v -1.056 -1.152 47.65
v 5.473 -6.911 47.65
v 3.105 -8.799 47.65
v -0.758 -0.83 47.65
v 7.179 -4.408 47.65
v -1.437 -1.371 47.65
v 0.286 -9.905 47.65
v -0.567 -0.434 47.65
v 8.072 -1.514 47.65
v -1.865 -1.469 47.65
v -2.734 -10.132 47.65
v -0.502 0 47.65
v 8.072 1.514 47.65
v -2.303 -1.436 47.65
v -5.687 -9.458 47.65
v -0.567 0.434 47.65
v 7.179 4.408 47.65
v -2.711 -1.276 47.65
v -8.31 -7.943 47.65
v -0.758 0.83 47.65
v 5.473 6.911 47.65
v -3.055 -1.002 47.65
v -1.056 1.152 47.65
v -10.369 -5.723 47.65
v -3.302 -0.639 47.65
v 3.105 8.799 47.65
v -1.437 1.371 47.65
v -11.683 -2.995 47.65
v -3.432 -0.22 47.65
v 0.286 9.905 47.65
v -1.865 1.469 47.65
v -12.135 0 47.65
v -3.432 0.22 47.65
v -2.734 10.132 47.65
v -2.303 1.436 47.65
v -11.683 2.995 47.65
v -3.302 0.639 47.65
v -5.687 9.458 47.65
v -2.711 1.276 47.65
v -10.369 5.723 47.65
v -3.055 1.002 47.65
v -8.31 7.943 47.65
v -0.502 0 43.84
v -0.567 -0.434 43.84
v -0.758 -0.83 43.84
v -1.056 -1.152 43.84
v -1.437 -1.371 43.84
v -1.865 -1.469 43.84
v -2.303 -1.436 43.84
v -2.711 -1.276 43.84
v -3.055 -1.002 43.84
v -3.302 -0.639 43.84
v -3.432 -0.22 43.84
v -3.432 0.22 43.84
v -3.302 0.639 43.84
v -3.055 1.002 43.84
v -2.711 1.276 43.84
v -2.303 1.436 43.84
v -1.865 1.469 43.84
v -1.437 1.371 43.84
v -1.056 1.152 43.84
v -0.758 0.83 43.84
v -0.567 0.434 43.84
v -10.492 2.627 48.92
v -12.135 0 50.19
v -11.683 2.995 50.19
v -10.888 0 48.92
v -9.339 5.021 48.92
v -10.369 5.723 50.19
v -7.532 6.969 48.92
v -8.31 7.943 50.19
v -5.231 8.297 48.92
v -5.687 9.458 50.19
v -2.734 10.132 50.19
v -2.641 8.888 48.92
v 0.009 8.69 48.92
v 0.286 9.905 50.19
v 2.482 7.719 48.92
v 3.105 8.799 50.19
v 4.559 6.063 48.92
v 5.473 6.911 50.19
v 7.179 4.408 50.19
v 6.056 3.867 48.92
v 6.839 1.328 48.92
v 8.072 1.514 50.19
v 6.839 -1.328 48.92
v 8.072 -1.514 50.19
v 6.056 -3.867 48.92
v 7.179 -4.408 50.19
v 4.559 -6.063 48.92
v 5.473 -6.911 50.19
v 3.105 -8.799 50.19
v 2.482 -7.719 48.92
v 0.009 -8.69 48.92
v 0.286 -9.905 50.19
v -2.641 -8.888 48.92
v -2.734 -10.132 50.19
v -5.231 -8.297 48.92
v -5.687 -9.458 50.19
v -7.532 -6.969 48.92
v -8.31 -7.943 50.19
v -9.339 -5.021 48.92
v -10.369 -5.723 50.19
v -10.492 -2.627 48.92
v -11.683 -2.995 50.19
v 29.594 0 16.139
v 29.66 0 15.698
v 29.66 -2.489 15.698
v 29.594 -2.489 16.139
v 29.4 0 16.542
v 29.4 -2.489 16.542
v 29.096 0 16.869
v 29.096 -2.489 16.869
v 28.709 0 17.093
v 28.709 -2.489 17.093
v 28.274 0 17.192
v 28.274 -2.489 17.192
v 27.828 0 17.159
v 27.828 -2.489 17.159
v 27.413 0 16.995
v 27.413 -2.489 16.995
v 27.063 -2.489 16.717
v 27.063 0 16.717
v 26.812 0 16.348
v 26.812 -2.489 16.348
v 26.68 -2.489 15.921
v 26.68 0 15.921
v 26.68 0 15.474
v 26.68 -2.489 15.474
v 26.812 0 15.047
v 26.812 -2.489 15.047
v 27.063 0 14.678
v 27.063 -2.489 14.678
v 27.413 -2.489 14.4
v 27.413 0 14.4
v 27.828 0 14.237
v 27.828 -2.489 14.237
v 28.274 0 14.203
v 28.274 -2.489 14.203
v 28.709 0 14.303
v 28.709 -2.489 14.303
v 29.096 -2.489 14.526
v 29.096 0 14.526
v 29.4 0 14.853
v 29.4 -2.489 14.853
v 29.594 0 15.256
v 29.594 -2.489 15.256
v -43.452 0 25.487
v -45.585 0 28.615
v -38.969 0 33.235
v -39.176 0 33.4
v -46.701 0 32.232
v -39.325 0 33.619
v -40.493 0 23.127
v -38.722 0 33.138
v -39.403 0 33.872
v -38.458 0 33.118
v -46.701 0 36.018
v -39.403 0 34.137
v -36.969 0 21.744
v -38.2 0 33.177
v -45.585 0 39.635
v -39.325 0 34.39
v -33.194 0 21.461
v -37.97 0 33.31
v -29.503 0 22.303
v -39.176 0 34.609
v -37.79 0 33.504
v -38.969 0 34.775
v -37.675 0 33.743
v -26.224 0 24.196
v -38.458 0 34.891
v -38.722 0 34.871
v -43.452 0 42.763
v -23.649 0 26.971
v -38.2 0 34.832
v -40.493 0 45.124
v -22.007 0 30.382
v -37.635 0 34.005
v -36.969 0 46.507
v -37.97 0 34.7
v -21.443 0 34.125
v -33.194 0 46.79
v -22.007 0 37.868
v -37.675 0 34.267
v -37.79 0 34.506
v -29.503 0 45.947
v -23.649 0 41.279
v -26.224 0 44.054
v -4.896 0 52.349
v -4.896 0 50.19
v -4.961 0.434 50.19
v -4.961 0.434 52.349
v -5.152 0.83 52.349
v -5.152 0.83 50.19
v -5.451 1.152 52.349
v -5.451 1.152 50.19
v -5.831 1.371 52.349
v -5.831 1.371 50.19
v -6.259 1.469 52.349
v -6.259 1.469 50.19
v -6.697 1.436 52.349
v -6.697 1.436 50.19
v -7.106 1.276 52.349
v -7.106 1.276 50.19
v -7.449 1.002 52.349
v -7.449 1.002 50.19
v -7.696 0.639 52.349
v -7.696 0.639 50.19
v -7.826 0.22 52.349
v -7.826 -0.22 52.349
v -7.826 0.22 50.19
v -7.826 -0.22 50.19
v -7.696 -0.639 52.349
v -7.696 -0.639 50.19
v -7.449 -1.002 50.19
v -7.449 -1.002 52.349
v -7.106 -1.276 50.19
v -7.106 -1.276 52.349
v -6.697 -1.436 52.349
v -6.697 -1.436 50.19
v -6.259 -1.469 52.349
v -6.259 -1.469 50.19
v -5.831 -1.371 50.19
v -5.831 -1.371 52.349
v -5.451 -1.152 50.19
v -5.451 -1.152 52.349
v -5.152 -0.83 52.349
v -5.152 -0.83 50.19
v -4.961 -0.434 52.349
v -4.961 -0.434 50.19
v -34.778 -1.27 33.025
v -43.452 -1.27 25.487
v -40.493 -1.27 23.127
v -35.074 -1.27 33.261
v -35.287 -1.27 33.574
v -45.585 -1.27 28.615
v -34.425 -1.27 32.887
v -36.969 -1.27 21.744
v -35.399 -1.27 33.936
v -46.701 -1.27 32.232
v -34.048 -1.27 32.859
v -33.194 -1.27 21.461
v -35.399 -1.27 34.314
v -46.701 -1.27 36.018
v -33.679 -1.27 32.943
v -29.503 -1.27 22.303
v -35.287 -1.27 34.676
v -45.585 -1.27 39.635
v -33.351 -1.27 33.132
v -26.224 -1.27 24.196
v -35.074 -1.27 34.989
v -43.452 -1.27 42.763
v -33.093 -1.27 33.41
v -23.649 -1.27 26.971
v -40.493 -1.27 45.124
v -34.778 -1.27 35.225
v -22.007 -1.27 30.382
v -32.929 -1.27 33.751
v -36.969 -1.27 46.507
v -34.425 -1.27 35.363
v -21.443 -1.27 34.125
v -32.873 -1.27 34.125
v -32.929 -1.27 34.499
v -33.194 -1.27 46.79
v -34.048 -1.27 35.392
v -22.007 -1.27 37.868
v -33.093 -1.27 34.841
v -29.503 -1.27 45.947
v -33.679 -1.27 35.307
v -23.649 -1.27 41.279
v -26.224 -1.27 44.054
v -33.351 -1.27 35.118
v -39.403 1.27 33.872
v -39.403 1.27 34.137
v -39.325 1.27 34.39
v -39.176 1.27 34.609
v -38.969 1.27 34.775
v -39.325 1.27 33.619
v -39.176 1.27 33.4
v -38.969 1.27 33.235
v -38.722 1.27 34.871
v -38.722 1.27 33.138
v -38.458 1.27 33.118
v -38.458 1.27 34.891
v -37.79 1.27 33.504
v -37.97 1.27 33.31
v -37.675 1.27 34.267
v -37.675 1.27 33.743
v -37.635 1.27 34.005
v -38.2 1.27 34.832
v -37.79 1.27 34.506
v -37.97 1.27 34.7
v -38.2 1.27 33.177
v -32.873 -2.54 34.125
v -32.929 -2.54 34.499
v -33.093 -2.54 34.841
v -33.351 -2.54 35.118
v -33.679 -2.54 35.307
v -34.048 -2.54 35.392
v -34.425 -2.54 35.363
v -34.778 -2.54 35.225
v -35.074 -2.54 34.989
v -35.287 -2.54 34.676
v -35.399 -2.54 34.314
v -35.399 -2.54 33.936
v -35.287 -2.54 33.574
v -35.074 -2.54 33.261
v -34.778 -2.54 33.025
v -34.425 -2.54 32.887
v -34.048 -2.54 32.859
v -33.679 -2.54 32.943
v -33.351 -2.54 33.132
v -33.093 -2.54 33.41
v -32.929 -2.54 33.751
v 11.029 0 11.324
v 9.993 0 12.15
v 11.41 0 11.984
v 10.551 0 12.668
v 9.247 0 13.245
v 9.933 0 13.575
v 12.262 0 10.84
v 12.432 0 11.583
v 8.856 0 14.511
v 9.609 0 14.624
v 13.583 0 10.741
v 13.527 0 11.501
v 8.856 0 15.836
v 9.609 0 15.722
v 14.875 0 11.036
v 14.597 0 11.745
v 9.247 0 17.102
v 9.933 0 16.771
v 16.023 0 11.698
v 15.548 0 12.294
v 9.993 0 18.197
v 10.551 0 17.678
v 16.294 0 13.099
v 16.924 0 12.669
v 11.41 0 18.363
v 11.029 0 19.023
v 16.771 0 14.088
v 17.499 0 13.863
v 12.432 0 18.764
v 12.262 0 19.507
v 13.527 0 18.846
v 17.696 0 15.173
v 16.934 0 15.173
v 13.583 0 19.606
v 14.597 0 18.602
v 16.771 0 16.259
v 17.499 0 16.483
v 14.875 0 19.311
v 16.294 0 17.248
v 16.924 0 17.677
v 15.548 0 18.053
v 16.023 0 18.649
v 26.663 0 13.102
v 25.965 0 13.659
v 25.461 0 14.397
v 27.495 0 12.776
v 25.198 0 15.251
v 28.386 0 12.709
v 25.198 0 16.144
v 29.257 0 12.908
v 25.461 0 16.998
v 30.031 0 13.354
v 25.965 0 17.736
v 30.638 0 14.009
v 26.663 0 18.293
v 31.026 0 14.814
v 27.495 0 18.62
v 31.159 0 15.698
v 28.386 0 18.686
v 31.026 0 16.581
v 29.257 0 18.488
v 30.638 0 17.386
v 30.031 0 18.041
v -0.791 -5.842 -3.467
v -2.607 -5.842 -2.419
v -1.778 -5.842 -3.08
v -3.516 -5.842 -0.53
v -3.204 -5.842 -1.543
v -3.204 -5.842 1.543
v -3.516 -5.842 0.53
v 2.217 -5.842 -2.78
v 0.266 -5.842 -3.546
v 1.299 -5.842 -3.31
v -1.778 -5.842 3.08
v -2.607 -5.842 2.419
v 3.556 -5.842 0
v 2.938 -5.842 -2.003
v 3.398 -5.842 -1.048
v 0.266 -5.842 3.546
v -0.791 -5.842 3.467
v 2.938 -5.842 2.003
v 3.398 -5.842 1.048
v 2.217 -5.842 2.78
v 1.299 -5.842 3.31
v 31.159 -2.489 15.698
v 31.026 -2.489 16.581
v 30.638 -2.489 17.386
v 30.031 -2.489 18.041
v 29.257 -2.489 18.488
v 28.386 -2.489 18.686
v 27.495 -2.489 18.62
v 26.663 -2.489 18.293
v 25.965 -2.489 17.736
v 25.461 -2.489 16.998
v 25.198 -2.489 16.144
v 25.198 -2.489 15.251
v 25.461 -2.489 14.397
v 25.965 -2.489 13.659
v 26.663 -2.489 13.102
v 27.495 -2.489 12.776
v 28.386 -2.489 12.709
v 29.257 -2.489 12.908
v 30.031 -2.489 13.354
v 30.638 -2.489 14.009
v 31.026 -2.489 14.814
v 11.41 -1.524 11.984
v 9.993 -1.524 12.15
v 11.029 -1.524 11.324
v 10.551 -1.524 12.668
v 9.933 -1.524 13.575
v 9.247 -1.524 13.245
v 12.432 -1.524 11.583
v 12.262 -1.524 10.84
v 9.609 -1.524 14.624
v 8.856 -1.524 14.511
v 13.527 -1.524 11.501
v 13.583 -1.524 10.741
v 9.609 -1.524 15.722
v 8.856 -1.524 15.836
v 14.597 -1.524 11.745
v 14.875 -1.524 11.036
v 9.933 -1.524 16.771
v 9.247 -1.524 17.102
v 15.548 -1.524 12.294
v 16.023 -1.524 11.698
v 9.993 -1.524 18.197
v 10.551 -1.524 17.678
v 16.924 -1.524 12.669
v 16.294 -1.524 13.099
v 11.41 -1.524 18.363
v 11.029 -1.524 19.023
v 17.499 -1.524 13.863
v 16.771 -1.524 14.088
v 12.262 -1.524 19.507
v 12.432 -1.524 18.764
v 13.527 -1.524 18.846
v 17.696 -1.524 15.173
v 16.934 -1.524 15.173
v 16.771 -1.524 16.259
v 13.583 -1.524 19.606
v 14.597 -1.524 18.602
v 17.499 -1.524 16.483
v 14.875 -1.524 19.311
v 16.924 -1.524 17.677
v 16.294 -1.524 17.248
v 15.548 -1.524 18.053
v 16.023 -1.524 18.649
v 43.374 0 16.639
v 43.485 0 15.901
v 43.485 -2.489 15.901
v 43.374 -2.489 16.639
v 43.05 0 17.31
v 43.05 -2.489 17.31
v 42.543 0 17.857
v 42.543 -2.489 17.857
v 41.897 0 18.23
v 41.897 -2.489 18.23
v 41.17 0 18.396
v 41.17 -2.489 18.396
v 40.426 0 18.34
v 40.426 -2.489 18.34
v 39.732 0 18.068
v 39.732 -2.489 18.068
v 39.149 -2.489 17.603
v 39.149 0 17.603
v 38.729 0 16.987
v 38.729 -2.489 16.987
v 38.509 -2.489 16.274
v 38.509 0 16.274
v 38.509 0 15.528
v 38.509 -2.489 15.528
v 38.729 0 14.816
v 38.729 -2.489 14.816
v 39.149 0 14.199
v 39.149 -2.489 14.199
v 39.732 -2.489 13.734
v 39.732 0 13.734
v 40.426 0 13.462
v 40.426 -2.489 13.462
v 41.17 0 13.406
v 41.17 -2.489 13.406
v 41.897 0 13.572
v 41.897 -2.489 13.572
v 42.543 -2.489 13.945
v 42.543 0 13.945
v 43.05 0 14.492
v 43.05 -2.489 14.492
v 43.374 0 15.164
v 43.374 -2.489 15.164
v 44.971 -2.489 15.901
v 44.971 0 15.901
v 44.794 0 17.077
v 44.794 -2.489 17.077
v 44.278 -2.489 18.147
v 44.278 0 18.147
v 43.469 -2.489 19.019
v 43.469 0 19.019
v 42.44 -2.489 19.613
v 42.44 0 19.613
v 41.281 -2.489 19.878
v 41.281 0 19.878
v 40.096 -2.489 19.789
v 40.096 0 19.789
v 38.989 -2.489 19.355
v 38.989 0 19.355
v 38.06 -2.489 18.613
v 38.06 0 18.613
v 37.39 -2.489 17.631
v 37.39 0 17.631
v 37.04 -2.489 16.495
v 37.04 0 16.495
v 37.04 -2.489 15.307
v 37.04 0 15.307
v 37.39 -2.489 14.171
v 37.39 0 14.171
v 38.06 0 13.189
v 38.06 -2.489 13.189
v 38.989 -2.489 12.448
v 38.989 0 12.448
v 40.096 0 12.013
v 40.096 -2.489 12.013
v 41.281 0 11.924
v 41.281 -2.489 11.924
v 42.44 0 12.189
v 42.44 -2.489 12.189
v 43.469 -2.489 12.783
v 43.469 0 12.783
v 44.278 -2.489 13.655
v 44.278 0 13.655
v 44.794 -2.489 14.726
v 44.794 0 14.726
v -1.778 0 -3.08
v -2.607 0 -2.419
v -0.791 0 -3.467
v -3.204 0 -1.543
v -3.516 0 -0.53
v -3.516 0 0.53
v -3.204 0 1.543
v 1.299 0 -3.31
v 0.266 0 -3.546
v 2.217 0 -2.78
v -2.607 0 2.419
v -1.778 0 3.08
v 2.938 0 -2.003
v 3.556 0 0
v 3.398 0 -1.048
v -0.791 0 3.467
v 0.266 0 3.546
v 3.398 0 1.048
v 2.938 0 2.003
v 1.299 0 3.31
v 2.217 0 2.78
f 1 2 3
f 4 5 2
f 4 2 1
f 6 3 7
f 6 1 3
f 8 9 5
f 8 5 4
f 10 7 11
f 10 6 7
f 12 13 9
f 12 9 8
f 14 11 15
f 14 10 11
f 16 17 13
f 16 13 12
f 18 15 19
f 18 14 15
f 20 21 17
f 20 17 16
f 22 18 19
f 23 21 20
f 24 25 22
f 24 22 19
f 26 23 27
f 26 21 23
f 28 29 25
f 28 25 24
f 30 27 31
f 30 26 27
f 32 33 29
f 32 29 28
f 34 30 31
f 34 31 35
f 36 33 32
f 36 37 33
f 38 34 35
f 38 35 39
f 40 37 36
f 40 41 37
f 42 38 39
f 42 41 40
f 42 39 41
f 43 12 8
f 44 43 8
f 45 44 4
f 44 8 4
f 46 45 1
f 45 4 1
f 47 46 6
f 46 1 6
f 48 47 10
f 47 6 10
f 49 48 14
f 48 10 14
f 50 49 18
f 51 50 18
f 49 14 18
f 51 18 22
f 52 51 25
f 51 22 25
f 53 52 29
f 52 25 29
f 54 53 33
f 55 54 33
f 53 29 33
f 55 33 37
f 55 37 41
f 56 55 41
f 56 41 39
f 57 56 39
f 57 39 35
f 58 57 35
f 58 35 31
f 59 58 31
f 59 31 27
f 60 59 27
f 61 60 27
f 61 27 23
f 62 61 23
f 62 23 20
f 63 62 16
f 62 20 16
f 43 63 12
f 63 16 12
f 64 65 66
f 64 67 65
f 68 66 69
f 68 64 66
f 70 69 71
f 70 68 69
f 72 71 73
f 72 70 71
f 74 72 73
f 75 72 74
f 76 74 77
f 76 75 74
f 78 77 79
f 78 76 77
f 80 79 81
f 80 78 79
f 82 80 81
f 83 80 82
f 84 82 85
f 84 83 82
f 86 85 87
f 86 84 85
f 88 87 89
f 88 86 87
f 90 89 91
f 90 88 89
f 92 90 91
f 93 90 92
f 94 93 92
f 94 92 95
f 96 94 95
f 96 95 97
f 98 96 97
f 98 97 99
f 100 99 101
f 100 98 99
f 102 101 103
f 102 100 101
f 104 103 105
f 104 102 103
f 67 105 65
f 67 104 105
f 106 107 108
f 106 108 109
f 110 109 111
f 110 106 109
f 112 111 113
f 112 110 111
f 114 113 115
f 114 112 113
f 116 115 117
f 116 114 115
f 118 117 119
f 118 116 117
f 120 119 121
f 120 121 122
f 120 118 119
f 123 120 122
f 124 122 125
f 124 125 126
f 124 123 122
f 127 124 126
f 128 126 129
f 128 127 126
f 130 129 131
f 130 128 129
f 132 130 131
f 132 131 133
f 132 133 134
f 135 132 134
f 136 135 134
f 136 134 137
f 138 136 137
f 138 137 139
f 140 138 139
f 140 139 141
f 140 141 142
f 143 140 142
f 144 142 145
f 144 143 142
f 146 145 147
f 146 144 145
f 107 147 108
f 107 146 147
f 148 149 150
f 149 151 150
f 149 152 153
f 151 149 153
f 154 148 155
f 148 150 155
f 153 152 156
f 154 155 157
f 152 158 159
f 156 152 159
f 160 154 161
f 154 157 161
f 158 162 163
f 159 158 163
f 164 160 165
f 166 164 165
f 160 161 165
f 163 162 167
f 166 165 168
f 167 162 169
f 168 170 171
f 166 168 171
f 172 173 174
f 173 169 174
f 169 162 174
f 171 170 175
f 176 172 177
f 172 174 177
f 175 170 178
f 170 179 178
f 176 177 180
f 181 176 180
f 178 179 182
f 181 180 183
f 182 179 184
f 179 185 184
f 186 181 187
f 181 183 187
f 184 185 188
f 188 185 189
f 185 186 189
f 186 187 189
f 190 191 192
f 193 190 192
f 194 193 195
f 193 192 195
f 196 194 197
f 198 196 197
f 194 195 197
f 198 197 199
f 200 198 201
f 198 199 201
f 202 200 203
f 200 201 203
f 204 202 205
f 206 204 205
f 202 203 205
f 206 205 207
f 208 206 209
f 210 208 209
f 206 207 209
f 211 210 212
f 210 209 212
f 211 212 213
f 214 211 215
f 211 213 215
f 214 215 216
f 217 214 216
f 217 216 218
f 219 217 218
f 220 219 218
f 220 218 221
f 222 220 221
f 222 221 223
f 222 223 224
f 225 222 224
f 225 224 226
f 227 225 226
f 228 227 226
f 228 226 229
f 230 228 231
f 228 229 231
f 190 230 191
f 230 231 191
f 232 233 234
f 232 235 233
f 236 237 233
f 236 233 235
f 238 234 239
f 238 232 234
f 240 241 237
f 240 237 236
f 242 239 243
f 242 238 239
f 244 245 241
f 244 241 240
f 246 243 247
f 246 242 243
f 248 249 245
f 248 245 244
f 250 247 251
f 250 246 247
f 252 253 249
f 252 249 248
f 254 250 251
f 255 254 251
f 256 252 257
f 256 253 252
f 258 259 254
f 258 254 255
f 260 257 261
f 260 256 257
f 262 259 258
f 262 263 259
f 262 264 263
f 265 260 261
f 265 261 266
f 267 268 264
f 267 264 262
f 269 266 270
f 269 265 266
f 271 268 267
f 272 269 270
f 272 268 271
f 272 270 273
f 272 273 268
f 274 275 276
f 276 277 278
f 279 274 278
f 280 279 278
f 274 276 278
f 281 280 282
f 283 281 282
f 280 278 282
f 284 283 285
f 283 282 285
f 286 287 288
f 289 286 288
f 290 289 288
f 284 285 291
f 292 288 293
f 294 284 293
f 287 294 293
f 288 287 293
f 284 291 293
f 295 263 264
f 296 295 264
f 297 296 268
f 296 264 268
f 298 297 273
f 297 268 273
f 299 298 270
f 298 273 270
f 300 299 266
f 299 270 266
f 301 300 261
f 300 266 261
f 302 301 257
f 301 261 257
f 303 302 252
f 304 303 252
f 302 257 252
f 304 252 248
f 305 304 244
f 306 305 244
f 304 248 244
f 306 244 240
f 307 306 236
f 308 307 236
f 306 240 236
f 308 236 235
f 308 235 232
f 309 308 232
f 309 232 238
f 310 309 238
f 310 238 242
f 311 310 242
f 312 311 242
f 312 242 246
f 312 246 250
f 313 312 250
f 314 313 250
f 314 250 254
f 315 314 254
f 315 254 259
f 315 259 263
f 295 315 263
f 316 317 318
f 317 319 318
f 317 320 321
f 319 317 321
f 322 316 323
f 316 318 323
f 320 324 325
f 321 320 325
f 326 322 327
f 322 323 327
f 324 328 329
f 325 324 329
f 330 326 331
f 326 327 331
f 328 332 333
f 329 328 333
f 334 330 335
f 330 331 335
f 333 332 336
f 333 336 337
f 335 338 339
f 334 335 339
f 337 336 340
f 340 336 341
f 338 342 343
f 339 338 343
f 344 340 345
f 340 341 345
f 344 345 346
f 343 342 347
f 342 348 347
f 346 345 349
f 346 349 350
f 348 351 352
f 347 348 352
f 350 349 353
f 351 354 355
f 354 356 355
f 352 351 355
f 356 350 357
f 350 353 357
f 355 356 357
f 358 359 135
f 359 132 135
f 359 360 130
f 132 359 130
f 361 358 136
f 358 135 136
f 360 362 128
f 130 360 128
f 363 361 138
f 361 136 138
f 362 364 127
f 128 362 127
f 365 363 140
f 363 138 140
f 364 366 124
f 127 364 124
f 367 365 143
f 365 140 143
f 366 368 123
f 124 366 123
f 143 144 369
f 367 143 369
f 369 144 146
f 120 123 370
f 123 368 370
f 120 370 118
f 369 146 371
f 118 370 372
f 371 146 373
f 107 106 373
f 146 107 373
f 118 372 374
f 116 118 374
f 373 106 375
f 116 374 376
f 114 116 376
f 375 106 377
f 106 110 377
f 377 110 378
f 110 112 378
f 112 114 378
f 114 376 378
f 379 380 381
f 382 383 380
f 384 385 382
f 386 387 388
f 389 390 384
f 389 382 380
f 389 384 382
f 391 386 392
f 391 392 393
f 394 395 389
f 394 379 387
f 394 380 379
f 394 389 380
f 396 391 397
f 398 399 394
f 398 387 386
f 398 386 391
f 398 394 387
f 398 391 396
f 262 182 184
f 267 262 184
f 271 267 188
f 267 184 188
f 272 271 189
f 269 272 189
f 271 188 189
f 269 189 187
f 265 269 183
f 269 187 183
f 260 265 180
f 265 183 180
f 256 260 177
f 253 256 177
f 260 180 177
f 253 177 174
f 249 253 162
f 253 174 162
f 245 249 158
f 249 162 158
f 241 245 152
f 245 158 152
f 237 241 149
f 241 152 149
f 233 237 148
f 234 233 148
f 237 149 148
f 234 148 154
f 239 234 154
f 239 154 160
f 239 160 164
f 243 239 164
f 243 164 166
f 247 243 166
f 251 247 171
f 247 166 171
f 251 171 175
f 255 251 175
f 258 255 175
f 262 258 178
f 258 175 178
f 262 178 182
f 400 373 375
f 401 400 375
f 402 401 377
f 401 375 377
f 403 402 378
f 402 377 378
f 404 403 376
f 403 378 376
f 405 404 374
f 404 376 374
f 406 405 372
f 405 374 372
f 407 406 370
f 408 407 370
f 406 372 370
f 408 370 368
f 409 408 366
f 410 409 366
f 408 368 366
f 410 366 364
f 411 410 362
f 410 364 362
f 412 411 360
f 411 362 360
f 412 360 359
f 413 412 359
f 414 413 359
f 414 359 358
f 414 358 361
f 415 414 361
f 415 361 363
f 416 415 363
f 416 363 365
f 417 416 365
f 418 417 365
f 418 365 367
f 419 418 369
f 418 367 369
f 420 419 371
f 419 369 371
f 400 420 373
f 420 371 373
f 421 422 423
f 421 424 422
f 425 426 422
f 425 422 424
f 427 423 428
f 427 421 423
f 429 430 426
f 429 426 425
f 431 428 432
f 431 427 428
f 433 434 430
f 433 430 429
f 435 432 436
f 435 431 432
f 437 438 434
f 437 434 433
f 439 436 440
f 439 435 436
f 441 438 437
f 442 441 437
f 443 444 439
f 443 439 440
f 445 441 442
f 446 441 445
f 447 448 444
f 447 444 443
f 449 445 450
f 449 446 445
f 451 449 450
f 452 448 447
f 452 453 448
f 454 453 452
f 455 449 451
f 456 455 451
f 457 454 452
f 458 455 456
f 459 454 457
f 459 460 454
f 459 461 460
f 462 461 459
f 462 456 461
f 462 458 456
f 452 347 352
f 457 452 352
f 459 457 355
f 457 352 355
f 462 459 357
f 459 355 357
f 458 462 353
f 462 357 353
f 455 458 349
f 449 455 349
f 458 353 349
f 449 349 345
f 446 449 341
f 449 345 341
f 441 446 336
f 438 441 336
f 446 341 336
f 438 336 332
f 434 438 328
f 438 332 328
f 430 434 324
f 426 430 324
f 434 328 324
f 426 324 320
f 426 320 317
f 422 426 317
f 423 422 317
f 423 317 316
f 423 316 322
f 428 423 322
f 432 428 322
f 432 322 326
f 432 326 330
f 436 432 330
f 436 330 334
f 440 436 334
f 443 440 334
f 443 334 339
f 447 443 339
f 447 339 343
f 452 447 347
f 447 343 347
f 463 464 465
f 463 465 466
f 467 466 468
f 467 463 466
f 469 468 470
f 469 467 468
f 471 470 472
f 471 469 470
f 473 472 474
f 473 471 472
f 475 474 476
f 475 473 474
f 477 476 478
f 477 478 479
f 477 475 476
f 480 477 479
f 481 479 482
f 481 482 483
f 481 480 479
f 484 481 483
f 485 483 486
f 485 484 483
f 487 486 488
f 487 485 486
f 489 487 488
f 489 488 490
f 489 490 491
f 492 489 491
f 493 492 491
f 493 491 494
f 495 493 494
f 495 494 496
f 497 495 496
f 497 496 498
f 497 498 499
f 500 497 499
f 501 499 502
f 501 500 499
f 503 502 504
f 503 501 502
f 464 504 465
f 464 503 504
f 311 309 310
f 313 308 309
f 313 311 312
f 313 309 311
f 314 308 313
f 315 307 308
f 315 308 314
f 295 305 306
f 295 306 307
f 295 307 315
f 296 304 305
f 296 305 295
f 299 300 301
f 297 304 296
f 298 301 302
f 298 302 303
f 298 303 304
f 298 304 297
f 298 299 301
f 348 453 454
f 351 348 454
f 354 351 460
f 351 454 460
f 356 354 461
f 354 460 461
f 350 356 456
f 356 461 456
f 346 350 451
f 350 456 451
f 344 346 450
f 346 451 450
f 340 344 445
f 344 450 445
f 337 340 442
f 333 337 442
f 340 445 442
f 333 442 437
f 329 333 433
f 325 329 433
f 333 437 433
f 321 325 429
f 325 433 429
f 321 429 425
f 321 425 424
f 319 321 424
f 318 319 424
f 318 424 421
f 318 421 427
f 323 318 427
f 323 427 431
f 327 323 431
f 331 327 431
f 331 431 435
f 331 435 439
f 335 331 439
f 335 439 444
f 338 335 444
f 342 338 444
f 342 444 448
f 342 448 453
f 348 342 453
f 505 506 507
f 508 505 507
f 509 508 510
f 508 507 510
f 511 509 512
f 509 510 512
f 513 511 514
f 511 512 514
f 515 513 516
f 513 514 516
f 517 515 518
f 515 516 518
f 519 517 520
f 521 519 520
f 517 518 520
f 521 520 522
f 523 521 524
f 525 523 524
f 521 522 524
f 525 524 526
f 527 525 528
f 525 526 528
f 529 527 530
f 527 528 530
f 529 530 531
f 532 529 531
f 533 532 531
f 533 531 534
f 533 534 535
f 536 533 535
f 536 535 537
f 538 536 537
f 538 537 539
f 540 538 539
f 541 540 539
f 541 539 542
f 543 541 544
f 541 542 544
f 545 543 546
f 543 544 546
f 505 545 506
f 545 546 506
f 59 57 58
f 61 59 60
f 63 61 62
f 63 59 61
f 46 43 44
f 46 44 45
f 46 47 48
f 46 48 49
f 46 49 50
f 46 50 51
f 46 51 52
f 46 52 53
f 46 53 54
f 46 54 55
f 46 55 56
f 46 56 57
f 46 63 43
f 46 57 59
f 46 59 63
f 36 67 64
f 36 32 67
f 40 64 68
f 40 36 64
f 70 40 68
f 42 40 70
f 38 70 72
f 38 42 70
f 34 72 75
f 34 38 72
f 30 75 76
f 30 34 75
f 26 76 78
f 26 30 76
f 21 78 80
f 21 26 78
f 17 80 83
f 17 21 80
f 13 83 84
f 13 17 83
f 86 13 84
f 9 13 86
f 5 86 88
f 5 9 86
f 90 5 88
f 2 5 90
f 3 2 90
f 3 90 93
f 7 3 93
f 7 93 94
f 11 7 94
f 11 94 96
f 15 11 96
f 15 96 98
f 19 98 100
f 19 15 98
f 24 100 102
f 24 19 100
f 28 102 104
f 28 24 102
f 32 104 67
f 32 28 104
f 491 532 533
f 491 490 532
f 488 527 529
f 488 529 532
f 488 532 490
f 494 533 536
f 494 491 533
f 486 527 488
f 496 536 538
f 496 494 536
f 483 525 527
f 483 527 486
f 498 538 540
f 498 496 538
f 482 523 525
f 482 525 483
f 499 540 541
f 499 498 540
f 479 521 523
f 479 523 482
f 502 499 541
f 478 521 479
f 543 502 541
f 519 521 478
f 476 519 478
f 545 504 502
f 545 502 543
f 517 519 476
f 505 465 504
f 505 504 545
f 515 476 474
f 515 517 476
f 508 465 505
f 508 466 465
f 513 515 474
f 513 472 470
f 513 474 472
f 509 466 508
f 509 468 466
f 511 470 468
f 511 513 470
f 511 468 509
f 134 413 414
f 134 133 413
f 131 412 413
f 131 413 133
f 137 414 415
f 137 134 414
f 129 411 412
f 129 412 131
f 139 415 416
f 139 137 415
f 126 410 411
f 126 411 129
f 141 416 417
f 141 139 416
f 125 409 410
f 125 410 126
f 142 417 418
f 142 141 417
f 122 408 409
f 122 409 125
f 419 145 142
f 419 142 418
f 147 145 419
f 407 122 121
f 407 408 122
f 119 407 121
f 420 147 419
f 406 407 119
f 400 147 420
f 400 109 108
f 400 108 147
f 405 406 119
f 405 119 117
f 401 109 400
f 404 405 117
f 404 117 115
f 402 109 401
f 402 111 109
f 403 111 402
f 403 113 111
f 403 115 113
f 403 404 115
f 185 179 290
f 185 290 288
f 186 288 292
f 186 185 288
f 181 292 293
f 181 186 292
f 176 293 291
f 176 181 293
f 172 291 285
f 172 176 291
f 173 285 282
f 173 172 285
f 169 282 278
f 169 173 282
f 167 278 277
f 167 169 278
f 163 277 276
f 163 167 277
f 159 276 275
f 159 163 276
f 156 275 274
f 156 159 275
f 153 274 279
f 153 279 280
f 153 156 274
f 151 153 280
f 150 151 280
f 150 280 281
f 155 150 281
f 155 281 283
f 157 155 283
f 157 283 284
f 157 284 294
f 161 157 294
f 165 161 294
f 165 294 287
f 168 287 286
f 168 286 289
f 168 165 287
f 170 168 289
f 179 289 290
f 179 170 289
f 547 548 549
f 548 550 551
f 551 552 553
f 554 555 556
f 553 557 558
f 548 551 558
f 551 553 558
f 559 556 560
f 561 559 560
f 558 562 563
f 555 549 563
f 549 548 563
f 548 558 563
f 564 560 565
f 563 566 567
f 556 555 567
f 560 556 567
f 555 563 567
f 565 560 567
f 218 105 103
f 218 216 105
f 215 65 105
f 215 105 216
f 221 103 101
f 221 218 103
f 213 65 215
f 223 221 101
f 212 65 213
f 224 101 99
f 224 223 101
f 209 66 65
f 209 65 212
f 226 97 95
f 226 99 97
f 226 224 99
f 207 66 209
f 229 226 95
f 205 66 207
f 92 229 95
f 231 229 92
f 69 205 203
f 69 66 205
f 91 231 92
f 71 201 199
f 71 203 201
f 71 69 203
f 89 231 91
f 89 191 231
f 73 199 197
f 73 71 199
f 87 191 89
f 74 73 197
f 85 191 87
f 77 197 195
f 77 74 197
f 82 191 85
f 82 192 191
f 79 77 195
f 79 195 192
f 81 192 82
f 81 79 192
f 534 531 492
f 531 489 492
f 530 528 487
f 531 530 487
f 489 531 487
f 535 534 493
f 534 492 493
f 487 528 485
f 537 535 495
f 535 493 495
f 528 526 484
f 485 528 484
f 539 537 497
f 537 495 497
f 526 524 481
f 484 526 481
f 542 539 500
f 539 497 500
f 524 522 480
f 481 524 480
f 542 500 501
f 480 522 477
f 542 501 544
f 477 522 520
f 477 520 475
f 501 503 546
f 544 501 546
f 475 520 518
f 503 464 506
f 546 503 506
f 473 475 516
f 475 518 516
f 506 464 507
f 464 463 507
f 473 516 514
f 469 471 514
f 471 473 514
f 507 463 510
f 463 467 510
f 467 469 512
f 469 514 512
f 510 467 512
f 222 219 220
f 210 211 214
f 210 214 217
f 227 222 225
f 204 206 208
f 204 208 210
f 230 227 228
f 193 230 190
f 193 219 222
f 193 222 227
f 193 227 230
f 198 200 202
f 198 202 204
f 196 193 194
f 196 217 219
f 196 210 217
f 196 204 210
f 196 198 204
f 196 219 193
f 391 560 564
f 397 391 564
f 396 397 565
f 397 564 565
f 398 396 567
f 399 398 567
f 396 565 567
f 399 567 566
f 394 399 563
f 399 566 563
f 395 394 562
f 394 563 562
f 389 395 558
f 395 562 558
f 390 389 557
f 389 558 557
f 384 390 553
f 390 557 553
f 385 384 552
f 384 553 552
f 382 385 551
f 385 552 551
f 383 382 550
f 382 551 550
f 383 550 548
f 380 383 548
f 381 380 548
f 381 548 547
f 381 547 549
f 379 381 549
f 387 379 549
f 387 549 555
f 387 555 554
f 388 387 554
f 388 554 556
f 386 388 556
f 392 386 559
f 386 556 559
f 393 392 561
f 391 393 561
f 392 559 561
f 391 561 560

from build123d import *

# Parameters (mm, degrees)
F0_R      = 3.556
F1_DEPTH  = 5.842
F2_R      = 4.445
F3_DEPTH  = 1.524
F4_R      = 3.683
F5_DEPTH  = 25.4
F6_R      = 12.7
F6_R_2    = 0.889
F6_R_3    = 1.27
F7_DEPTH  = 1.27
F8_DEPTH  = 1.27
F9_DEPTH  = 2.54
F11_R     = 1.4732
F12_DEPTH = 2.159
F2_R_2    = 2.9972
F2_R_3    = 1.4986
F2_R_4    = 3.9878
F2_R_5    = 2.5019
F13_DEPTH = 2.4892
F14_R     = 1.4732
F15_DEPTH = 3.81


with BuildPart() as f1:
    # F0 (on Front) → F1 (new body)
    with BuildSketch(Plane.XZ):
        Circle(F0_R)
    extrude(amount=F1_DEPTH)


with BuildPart() as f3:
    # F2 (on Front) → F3 (new body)
    with BuildSketch(Plane.XZ):
        with Locations((13.251319, 15.17326)):
            Circle(F2_R)
    extrude(amount=F3_DEPTH)

    # F4 (on face) → F5 (cut)
    with BuildSketch(Plane.XZ.offset(1.524)):
        with Locations((13.251319, 15.17326)):
            Circle(F4_R)
    extrude(amount=-F5_DEPTH, mode=Mode.SUBTRACT)


with BuildPart() as f7:
    # F6 (on Front) → F7 (new body)
    with BuildSketch(Plane.XZ):
        with Locations((-34.14271, 34.125097)):
            Circle(F6_R)
        with Locations((-38.524355, 34.004767)):
            Circle(F6_R_2, mode=Mode.SUBTRACT)
        with Locations((-34.14271, 34.125097)):
            Circle(F6_R_3, mode=Mode.SUBTRACT)
        with Locations((-38.524355, 34.004767)):
            Circle(F6_R_2)
        with Locations((-34.14271, 34.125097)):
            Circle(F6_R_3)
    extrude(amount=F7_DEPTH)

    # F6 (on Front) → F8 (join)
    with BuildSketch(Plane.XZ):
        with Locations((-38.524355, 34.004767)):
            Circle(F6_R_2)
    extrude(amount=-F8_DEPTH)

    # F6 (on Front) → F9 (join)
    with BuildSketch(Plane.XZ):
        with Locations((-34.14271, 34.125097)):
            Circle(F6_R_3)
    extrude(amount=F9_DEPTH)


with BuildPart() as f10:
    # F6 (on Front) → F10 (revolve)
    with BuildSketch(Plane.XZ):
        Polygon((-1.974862, 50.189517), (-12.134862, 50.189517), (-10.888062, 48.919517), (-12.134862, 47.649517), (-1.974862, 47.649517), align=None)
    revolve(axis=Axis((-1.974862, 0, 48.919517), (0, 0, -1)))

    # F11 (on face) → F12 (join)
    with BuildSketch(Plane.XY.offset(50.189517)):
        with Locations((-6.369062, 0)):
            Circle(F11_R)
    extrude(amount=F12_DEPTH)

    # F14 (on face) → F15 (join)
    with BuildSketch(Plane(origin=(0, 0, 47.649517), x_dir=(1, 0, 0), z_dir=(0, 0, -1))):
        with Locations((-1.974862, 0)):
            Circle(F14_R)
    extrude(amount=F15_DEPTH)


with BuildPart() as f13:
    # F2 (on Front) → F13 (new body)
    with BuildSketch(Plane.XZ):
        with Locations((28.161833, 15.697576)):
            Circle(F2_R_2)
        with Locations((28.161833, 15.697576)):
            Circle(F2_R_3, mode=Mode.SUBTRACT)
        with Locations((40.982924, 15.901085)):
            Circle(F2_R_4)
        with Locations((40.982924, 15.901085)):
            Circle(F2_R_5, mode=Mode.SUBTRACT)
    extrude(amount=F13_DEPTH)


solid = Compound([f1.part, f3.part, f7.part, f10.part, f13.part])
